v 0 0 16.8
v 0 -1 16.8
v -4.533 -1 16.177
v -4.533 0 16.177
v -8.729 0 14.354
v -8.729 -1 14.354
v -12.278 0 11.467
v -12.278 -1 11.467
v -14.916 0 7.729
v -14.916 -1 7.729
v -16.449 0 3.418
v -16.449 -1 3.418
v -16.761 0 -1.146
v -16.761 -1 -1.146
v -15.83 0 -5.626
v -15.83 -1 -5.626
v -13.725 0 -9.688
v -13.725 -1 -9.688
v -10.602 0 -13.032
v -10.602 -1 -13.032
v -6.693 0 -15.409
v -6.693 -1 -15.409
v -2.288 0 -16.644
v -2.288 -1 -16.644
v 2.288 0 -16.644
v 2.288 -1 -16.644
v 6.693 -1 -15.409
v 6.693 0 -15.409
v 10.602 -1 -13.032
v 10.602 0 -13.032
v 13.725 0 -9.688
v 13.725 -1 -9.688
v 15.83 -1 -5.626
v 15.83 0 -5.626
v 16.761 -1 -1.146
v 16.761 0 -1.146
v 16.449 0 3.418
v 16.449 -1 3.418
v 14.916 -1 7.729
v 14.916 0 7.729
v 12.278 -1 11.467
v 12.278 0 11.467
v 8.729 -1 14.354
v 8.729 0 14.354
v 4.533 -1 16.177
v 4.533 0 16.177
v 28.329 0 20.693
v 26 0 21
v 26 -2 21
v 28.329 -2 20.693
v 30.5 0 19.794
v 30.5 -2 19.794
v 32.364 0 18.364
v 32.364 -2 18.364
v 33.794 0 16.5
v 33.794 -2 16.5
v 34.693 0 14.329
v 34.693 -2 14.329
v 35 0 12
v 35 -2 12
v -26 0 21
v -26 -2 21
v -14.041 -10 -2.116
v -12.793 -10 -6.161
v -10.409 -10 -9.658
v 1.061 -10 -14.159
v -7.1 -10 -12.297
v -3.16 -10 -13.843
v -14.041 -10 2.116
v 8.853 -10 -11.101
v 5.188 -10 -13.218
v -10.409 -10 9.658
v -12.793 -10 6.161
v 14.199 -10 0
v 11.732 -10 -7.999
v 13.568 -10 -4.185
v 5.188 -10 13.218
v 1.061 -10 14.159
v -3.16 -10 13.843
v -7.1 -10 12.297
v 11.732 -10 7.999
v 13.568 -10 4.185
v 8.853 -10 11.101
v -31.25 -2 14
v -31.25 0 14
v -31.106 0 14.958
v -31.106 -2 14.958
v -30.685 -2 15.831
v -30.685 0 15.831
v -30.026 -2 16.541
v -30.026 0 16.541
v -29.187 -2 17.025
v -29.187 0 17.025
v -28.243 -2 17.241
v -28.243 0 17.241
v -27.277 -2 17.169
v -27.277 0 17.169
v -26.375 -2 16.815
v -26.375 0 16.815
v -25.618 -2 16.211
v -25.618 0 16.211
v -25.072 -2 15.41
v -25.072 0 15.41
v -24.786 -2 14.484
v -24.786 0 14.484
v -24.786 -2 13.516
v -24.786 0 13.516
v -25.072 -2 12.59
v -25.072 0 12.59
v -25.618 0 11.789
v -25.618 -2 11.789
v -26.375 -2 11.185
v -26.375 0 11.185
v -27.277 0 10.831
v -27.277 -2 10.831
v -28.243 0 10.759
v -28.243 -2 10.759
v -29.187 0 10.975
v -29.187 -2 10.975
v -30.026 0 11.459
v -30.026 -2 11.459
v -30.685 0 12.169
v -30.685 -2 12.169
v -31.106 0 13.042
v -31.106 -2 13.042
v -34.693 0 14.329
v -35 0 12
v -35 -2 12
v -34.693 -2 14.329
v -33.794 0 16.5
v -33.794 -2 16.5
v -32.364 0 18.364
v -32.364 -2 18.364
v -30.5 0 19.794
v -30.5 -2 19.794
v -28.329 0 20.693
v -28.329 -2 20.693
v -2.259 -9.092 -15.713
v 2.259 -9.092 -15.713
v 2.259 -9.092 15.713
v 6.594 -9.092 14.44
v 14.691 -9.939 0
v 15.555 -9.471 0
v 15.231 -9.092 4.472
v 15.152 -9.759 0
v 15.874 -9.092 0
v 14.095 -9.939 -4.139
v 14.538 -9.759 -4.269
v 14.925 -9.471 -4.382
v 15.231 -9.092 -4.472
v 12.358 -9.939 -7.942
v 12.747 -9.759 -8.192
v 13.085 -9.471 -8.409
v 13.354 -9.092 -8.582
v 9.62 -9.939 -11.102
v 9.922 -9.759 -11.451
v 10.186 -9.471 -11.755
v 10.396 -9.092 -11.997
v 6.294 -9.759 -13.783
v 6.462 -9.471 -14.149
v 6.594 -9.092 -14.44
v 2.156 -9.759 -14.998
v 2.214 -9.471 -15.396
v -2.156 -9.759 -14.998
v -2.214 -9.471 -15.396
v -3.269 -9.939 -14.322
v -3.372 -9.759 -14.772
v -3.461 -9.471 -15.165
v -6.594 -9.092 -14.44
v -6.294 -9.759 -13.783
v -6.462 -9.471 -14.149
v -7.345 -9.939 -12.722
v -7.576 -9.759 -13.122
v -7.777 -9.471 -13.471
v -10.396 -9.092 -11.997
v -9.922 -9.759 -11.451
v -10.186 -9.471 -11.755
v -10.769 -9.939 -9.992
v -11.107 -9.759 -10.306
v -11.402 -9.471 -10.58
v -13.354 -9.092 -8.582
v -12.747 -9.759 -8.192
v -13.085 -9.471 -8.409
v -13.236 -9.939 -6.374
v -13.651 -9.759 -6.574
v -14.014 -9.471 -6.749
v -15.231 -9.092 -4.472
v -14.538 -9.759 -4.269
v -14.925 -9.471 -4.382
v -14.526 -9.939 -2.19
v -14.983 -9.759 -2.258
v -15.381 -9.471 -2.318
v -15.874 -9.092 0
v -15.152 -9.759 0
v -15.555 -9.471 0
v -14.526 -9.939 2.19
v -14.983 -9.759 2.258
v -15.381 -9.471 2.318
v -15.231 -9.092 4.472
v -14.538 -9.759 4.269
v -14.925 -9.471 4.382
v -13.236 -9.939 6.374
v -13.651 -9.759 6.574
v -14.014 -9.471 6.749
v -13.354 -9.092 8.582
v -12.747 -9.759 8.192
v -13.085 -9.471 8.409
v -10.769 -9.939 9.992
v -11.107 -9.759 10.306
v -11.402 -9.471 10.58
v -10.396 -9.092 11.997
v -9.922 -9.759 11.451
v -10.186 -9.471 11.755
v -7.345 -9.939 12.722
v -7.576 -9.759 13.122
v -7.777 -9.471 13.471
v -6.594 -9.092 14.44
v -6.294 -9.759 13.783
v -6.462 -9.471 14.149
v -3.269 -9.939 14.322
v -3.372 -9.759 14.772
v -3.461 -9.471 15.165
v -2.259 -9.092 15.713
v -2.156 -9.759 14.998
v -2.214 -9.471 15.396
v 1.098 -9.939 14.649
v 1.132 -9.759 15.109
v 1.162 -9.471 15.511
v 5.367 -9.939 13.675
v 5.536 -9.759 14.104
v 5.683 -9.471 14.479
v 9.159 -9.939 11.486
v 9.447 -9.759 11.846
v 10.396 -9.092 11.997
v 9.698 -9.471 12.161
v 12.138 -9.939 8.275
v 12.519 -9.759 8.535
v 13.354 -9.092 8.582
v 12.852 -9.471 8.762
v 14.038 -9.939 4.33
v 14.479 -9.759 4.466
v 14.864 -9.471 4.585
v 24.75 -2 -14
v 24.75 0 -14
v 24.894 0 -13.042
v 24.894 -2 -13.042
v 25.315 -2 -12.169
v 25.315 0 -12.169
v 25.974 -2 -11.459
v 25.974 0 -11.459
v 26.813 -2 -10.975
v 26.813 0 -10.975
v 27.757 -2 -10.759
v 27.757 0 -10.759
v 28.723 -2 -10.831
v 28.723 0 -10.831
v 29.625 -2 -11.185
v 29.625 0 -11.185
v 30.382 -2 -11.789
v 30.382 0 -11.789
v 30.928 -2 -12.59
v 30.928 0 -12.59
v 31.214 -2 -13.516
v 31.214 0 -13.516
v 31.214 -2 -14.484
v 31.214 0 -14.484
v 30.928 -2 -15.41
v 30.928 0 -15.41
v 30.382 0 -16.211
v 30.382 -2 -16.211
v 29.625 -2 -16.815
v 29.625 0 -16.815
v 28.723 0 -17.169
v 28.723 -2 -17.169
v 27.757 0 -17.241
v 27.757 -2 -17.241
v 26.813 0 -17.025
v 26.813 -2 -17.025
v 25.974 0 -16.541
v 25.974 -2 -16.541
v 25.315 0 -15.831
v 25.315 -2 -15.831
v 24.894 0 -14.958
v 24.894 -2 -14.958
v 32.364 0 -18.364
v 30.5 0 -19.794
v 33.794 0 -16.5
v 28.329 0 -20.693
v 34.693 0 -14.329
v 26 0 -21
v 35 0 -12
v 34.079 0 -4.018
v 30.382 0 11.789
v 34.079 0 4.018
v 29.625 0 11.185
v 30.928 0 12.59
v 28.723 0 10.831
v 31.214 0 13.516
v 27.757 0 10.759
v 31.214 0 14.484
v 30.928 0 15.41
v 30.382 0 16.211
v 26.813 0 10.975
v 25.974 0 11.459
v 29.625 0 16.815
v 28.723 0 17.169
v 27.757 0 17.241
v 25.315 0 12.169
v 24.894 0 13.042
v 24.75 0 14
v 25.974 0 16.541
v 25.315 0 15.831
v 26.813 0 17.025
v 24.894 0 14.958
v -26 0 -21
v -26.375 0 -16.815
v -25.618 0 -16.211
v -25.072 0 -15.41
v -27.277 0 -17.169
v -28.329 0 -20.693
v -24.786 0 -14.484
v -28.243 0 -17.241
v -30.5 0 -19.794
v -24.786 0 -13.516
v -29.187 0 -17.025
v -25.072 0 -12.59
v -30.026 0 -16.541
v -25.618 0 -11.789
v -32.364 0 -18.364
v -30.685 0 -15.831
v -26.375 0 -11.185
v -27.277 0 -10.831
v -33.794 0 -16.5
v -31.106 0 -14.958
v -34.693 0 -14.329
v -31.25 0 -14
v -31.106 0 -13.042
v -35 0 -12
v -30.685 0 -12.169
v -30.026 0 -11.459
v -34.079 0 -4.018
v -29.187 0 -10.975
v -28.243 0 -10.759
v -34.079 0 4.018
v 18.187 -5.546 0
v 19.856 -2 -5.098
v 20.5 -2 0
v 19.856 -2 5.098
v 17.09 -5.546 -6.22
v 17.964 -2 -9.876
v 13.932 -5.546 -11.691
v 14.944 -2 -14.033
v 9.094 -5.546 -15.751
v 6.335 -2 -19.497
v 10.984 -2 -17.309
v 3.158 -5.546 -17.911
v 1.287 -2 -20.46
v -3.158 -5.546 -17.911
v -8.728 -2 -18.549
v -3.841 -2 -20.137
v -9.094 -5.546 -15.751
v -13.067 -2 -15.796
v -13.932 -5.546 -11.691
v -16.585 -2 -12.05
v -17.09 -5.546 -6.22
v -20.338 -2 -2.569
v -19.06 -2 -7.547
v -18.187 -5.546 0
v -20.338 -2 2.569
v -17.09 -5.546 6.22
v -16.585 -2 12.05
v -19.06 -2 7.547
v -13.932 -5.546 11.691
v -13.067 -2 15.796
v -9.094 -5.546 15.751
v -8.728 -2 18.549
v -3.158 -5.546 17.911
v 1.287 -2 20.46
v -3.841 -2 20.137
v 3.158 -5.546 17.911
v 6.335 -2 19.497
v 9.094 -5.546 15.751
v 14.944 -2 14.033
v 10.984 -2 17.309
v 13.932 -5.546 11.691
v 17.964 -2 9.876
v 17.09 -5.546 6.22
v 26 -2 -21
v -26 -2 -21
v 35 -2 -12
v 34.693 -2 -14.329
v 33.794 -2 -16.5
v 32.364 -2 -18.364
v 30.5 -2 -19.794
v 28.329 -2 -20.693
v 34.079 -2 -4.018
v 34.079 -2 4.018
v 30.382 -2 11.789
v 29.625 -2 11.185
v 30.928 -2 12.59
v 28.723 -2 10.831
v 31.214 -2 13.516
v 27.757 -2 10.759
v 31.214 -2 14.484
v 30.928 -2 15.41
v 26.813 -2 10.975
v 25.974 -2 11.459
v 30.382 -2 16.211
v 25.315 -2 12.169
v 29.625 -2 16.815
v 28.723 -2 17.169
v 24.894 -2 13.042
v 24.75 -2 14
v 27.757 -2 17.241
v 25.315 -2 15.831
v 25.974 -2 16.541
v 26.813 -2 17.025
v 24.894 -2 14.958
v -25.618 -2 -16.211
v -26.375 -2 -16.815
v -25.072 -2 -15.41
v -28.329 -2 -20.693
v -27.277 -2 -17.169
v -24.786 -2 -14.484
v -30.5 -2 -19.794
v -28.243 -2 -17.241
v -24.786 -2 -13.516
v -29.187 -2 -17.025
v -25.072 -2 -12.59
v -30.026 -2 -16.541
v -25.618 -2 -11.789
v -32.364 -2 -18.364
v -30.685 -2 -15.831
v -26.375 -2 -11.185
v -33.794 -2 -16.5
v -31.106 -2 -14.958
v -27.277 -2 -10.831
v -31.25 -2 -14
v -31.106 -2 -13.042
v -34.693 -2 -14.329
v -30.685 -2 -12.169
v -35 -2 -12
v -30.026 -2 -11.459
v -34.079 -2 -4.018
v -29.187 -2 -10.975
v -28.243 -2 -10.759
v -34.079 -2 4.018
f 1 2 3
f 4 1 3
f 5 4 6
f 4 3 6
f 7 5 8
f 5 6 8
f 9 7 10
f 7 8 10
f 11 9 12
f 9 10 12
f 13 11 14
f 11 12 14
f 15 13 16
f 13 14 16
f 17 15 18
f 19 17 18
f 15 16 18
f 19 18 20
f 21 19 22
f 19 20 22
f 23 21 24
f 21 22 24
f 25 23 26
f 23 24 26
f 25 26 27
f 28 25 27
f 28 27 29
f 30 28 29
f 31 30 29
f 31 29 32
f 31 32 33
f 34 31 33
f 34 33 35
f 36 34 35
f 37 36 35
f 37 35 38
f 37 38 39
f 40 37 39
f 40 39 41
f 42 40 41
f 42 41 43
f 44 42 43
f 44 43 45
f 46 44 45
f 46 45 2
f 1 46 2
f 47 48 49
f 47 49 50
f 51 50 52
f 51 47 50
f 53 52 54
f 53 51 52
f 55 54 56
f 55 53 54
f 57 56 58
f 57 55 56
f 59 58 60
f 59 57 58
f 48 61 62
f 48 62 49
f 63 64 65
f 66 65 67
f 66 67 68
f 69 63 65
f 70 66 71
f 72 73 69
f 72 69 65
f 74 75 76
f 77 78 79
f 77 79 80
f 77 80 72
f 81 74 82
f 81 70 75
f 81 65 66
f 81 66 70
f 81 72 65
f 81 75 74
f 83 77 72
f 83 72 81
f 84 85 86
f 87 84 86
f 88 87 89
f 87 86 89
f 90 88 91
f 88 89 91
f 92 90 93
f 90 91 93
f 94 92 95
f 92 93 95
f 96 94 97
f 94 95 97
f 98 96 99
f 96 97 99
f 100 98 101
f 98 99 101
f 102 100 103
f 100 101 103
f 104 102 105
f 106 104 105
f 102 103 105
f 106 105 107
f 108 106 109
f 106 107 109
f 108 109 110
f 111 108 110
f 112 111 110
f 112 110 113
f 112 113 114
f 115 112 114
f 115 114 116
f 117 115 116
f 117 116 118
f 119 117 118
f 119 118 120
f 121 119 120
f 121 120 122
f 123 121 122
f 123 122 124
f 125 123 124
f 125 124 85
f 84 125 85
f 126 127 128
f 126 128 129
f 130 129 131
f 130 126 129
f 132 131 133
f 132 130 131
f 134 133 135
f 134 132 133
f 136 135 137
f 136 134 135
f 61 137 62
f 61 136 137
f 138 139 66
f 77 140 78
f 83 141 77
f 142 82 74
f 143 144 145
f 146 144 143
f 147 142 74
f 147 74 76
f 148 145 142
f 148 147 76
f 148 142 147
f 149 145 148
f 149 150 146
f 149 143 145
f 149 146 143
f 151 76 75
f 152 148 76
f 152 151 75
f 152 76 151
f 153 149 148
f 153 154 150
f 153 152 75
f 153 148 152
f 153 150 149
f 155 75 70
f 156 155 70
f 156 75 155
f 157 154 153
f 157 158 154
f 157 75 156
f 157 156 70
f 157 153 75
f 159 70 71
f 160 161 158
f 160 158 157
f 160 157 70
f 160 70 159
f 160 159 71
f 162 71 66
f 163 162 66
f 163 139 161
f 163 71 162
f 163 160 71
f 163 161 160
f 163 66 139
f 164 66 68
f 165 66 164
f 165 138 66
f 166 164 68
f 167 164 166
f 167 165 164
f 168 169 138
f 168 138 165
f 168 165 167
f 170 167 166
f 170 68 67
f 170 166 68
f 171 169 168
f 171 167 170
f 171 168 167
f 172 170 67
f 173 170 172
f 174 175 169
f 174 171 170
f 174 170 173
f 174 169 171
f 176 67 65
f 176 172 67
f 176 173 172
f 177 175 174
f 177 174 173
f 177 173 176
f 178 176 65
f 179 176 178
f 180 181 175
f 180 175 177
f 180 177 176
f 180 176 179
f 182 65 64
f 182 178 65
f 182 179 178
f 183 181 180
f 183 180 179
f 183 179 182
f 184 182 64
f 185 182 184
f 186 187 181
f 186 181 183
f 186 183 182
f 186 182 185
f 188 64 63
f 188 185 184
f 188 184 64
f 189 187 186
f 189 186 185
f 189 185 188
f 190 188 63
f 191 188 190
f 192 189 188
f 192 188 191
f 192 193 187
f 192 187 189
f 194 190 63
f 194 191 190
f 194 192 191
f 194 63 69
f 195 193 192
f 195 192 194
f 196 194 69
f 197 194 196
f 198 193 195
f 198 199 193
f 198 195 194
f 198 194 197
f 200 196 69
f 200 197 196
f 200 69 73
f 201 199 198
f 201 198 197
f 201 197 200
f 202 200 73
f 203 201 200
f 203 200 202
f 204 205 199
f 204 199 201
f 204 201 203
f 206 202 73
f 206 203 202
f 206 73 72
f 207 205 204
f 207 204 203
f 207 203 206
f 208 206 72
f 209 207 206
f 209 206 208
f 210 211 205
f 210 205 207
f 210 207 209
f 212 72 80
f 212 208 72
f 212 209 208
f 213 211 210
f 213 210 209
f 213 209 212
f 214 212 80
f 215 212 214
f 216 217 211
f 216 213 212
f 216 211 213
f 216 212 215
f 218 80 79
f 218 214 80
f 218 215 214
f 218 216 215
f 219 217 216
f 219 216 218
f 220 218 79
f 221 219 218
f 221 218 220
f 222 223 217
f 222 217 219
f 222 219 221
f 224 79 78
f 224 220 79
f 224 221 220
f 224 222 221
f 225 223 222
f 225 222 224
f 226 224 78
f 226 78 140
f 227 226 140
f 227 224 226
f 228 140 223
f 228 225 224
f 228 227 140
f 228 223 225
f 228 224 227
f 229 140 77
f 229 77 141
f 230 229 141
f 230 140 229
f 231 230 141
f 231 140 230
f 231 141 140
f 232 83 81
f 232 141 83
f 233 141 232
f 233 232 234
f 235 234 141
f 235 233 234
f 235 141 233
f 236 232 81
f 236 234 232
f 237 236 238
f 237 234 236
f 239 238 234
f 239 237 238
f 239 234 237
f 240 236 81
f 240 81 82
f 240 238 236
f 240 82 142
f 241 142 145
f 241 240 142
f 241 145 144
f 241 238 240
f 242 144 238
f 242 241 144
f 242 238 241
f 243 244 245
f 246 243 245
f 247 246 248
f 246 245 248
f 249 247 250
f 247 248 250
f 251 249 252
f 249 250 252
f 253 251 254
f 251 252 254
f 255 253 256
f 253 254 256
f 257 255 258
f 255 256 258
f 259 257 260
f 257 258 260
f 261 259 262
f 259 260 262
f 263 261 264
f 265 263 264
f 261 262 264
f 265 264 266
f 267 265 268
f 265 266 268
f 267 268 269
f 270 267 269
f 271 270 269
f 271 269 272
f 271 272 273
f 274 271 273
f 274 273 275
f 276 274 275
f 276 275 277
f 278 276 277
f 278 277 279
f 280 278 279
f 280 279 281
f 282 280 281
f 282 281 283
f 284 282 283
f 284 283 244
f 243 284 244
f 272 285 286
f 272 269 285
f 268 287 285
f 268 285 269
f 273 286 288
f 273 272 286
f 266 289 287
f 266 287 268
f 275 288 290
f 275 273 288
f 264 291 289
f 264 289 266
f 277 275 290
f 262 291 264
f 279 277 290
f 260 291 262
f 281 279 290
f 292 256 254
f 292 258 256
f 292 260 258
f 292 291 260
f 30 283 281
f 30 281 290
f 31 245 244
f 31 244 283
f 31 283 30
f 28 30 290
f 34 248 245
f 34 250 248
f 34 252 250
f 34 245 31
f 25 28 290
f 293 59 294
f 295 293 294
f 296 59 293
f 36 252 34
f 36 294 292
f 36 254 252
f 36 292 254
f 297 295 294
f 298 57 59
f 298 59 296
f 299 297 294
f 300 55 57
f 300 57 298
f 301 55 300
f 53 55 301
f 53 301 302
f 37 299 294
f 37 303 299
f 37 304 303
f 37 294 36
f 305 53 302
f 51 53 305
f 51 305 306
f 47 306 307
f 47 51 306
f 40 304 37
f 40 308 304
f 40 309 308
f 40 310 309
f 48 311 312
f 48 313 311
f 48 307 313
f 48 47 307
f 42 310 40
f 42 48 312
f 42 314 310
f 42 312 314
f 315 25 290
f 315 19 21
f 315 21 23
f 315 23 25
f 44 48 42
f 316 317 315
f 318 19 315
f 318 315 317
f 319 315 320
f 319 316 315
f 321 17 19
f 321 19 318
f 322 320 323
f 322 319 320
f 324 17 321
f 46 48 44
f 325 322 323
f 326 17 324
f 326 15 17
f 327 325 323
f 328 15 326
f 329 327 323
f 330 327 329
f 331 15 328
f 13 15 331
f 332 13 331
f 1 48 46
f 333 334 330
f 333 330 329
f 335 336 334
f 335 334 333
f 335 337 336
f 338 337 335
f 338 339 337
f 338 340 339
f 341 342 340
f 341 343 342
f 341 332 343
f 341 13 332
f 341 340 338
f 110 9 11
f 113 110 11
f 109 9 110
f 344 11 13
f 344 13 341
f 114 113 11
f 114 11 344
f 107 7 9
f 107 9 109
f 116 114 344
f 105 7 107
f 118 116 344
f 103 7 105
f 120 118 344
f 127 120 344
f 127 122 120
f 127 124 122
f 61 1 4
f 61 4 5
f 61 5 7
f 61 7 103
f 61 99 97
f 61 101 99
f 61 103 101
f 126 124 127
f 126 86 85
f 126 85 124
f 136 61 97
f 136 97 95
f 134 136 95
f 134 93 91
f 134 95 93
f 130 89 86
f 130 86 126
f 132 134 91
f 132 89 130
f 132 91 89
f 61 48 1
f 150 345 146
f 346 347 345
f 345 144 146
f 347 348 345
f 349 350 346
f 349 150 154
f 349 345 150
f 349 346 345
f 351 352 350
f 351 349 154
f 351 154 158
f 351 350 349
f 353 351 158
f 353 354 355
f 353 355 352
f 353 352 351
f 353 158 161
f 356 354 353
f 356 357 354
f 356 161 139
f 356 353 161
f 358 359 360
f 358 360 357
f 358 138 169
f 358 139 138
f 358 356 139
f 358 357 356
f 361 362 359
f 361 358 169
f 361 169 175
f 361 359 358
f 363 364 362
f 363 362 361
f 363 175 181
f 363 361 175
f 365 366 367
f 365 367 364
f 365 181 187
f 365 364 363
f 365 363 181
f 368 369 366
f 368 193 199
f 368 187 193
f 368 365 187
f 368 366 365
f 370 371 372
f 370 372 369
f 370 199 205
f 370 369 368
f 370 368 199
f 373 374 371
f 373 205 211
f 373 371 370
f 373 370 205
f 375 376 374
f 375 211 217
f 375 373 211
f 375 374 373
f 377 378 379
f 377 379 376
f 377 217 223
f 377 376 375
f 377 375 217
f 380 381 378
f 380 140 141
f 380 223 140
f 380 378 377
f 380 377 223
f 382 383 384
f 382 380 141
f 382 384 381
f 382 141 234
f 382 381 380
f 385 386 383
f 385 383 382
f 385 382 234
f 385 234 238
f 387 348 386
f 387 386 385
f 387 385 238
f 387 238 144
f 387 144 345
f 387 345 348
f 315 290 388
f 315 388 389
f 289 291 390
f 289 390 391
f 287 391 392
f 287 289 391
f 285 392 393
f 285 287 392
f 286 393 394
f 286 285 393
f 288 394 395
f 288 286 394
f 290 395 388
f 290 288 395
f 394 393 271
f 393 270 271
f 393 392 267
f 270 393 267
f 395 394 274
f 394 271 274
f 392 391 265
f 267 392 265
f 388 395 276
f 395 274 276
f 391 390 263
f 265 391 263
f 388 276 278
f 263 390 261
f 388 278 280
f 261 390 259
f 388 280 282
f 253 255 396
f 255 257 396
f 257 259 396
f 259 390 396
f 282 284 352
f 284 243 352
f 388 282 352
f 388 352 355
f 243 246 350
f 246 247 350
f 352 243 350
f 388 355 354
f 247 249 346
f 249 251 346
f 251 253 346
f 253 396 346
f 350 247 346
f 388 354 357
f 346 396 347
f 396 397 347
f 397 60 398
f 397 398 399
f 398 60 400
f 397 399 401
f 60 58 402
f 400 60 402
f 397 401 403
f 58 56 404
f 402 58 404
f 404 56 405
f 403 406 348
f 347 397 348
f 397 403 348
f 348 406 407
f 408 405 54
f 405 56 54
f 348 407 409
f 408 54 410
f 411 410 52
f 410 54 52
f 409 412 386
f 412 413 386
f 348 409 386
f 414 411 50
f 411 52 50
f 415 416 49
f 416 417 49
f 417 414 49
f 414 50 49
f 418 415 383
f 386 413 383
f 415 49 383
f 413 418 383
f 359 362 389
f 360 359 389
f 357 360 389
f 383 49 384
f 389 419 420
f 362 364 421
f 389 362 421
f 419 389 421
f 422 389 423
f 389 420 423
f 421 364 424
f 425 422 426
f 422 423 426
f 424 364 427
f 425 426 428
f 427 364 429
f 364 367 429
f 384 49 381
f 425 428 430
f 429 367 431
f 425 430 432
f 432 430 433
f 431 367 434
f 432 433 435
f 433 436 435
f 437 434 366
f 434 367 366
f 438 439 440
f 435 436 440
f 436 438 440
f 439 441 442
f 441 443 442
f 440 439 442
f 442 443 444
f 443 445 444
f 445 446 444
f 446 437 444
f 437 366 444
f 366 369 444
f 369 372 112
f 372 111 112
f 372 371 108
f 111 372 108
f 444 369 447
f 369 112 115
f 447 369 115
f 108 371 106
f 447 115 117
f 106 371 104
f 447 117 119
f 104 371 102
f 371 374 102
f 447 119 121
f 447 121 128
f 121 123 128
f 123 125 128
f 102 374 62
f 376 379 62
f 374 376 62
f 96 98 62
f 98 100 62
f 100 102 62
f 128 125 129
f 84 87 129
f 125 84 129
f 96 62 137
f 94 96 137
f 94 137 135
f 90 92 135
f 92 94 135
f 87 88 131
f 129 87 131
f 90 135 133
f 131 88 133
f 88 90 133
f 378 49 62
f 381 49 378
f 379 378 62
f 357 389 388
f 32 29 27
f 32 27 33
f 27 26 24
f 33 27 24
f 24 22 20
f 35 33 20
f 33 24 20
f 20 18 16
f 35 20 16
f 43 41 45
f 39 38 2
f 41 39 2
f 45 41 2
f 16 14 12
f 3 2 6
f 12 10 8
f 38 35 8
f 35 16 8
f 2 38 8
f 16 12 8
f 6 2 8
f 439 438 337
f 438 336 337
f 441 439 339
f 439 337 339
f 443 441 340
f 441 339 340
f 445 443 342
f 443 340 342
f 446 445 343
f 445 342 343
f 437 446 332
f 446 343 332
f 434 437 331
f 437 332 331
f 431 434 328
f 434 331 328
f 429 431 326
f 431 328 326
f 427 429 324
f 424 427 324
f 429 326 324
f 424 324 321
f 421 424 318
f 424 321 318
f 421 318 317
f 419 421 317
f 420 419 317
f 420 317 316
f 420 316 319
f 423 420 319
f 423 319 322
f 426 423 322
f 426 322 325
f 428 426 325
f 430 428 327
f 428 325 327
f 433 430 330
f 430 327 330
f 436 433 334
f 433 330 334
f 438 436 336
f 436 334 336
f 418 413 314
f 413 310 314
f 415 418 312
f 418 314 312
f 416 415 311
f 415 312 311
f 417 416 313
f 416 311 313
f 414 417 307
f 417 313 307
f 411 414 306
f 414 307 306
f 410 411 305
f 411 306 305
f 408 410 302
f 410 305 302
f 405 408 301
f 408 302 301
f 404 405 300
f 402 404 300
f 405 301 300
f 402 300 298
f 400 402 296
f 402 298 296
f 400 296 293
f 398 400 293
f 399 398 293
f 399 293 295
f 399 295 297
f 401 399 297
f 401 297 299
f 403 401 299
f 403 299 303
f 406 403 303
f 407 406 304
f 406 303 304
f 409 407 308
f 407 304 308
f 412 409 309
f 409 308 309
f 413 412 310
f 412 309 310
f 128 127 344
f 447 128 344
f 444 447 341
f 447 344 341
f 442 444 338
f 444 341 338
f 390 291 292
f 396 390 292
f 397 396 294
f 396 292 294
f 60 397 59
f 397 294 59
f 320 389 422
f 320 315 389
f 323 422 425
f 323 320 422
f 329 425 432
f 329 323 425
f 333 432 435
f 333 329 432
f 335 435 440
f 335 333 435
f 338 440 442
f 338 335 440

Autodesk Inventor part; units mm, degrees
sketch "Sketch_1" plane through (0, 0, 0) normal (0, 1, 0) x (-1, 0, 0)
  arc A0 (35, 12) -> (35, -12) centre (103.9638, 0) ccw
  arc A1 (35, 12) -> (26, 21) centre (26, 12) ccw
  line L0 (26, 21) -> (-26, 21)
  arc A2 (-26, 21) -> (-35, 12) centre (-26, 12) ccw
  arc A3 (-35, -12) -> (-35, 12) centre (-103.9638, 0) ccw
  arc A4 (-35, -12) -> (-26, -21) centre (-26, -12) ccw
  line L1 (-26, -21) -> (26, -21)
  arc A5 (26, -21) -> (35, -12) centre (26, -12) ccw
  circle A6 centre (-28, 14) radius 3.25
  circle A7 centre (-28, -14) radius 3.25
  circle A8 centre (28, 14) radius 3.25
  circle A9 centre (28, -14) radius 3.25
extrude "Extrusion1" add sketch "Sketch_1" against normal blind 2
sketch "Sketch2" plane through (0, 0, 0) normal (0, 1, 0) x (1, 0, 0)
  point P0 (0, 0)
hole "Hole1" at (0, 0, 0) direction (0, -1, 0) diameter 33.6 depth 1
sketch "Sketch_4" plane through (0, 0, 0) normal (0, 0, 1) x (1, 0, 0)
  line L0 (0, -10) -> (0, -2)
  line L1 (0, -2) -> (20.5, -2)
  line L2 (20.5, -2) -> (15.8744, -9.0925)
  arc A0 (14.1992, -10) -> (15.8744, -9.0925) centre (14.1992, -8) ccw
  line L3 (14.1992, -10) -> (0, -10)
  line L4 (0, -10) -> (0, -2)
revolve "Revolution1" add sketch "Sketch_4" angle 360 about axis through (0, -10, 0) along (0, -1, 0)
ref_plane "swivel_to_body_XY" through (0, -10, 0) normal (0, 1, 0) x (1, 0, 0)
ref_plane "swivel_to_body_YZ" through (0, -10, 0) normal (1, 0, 0) x (0, 0, -1)
ref_plane "swivel_to_body_ZX" through (0, -10, 0) normal (0, 0, -1) x (0, 1, 0)
properties part number "CHAMJ-E50-Rswivel"
